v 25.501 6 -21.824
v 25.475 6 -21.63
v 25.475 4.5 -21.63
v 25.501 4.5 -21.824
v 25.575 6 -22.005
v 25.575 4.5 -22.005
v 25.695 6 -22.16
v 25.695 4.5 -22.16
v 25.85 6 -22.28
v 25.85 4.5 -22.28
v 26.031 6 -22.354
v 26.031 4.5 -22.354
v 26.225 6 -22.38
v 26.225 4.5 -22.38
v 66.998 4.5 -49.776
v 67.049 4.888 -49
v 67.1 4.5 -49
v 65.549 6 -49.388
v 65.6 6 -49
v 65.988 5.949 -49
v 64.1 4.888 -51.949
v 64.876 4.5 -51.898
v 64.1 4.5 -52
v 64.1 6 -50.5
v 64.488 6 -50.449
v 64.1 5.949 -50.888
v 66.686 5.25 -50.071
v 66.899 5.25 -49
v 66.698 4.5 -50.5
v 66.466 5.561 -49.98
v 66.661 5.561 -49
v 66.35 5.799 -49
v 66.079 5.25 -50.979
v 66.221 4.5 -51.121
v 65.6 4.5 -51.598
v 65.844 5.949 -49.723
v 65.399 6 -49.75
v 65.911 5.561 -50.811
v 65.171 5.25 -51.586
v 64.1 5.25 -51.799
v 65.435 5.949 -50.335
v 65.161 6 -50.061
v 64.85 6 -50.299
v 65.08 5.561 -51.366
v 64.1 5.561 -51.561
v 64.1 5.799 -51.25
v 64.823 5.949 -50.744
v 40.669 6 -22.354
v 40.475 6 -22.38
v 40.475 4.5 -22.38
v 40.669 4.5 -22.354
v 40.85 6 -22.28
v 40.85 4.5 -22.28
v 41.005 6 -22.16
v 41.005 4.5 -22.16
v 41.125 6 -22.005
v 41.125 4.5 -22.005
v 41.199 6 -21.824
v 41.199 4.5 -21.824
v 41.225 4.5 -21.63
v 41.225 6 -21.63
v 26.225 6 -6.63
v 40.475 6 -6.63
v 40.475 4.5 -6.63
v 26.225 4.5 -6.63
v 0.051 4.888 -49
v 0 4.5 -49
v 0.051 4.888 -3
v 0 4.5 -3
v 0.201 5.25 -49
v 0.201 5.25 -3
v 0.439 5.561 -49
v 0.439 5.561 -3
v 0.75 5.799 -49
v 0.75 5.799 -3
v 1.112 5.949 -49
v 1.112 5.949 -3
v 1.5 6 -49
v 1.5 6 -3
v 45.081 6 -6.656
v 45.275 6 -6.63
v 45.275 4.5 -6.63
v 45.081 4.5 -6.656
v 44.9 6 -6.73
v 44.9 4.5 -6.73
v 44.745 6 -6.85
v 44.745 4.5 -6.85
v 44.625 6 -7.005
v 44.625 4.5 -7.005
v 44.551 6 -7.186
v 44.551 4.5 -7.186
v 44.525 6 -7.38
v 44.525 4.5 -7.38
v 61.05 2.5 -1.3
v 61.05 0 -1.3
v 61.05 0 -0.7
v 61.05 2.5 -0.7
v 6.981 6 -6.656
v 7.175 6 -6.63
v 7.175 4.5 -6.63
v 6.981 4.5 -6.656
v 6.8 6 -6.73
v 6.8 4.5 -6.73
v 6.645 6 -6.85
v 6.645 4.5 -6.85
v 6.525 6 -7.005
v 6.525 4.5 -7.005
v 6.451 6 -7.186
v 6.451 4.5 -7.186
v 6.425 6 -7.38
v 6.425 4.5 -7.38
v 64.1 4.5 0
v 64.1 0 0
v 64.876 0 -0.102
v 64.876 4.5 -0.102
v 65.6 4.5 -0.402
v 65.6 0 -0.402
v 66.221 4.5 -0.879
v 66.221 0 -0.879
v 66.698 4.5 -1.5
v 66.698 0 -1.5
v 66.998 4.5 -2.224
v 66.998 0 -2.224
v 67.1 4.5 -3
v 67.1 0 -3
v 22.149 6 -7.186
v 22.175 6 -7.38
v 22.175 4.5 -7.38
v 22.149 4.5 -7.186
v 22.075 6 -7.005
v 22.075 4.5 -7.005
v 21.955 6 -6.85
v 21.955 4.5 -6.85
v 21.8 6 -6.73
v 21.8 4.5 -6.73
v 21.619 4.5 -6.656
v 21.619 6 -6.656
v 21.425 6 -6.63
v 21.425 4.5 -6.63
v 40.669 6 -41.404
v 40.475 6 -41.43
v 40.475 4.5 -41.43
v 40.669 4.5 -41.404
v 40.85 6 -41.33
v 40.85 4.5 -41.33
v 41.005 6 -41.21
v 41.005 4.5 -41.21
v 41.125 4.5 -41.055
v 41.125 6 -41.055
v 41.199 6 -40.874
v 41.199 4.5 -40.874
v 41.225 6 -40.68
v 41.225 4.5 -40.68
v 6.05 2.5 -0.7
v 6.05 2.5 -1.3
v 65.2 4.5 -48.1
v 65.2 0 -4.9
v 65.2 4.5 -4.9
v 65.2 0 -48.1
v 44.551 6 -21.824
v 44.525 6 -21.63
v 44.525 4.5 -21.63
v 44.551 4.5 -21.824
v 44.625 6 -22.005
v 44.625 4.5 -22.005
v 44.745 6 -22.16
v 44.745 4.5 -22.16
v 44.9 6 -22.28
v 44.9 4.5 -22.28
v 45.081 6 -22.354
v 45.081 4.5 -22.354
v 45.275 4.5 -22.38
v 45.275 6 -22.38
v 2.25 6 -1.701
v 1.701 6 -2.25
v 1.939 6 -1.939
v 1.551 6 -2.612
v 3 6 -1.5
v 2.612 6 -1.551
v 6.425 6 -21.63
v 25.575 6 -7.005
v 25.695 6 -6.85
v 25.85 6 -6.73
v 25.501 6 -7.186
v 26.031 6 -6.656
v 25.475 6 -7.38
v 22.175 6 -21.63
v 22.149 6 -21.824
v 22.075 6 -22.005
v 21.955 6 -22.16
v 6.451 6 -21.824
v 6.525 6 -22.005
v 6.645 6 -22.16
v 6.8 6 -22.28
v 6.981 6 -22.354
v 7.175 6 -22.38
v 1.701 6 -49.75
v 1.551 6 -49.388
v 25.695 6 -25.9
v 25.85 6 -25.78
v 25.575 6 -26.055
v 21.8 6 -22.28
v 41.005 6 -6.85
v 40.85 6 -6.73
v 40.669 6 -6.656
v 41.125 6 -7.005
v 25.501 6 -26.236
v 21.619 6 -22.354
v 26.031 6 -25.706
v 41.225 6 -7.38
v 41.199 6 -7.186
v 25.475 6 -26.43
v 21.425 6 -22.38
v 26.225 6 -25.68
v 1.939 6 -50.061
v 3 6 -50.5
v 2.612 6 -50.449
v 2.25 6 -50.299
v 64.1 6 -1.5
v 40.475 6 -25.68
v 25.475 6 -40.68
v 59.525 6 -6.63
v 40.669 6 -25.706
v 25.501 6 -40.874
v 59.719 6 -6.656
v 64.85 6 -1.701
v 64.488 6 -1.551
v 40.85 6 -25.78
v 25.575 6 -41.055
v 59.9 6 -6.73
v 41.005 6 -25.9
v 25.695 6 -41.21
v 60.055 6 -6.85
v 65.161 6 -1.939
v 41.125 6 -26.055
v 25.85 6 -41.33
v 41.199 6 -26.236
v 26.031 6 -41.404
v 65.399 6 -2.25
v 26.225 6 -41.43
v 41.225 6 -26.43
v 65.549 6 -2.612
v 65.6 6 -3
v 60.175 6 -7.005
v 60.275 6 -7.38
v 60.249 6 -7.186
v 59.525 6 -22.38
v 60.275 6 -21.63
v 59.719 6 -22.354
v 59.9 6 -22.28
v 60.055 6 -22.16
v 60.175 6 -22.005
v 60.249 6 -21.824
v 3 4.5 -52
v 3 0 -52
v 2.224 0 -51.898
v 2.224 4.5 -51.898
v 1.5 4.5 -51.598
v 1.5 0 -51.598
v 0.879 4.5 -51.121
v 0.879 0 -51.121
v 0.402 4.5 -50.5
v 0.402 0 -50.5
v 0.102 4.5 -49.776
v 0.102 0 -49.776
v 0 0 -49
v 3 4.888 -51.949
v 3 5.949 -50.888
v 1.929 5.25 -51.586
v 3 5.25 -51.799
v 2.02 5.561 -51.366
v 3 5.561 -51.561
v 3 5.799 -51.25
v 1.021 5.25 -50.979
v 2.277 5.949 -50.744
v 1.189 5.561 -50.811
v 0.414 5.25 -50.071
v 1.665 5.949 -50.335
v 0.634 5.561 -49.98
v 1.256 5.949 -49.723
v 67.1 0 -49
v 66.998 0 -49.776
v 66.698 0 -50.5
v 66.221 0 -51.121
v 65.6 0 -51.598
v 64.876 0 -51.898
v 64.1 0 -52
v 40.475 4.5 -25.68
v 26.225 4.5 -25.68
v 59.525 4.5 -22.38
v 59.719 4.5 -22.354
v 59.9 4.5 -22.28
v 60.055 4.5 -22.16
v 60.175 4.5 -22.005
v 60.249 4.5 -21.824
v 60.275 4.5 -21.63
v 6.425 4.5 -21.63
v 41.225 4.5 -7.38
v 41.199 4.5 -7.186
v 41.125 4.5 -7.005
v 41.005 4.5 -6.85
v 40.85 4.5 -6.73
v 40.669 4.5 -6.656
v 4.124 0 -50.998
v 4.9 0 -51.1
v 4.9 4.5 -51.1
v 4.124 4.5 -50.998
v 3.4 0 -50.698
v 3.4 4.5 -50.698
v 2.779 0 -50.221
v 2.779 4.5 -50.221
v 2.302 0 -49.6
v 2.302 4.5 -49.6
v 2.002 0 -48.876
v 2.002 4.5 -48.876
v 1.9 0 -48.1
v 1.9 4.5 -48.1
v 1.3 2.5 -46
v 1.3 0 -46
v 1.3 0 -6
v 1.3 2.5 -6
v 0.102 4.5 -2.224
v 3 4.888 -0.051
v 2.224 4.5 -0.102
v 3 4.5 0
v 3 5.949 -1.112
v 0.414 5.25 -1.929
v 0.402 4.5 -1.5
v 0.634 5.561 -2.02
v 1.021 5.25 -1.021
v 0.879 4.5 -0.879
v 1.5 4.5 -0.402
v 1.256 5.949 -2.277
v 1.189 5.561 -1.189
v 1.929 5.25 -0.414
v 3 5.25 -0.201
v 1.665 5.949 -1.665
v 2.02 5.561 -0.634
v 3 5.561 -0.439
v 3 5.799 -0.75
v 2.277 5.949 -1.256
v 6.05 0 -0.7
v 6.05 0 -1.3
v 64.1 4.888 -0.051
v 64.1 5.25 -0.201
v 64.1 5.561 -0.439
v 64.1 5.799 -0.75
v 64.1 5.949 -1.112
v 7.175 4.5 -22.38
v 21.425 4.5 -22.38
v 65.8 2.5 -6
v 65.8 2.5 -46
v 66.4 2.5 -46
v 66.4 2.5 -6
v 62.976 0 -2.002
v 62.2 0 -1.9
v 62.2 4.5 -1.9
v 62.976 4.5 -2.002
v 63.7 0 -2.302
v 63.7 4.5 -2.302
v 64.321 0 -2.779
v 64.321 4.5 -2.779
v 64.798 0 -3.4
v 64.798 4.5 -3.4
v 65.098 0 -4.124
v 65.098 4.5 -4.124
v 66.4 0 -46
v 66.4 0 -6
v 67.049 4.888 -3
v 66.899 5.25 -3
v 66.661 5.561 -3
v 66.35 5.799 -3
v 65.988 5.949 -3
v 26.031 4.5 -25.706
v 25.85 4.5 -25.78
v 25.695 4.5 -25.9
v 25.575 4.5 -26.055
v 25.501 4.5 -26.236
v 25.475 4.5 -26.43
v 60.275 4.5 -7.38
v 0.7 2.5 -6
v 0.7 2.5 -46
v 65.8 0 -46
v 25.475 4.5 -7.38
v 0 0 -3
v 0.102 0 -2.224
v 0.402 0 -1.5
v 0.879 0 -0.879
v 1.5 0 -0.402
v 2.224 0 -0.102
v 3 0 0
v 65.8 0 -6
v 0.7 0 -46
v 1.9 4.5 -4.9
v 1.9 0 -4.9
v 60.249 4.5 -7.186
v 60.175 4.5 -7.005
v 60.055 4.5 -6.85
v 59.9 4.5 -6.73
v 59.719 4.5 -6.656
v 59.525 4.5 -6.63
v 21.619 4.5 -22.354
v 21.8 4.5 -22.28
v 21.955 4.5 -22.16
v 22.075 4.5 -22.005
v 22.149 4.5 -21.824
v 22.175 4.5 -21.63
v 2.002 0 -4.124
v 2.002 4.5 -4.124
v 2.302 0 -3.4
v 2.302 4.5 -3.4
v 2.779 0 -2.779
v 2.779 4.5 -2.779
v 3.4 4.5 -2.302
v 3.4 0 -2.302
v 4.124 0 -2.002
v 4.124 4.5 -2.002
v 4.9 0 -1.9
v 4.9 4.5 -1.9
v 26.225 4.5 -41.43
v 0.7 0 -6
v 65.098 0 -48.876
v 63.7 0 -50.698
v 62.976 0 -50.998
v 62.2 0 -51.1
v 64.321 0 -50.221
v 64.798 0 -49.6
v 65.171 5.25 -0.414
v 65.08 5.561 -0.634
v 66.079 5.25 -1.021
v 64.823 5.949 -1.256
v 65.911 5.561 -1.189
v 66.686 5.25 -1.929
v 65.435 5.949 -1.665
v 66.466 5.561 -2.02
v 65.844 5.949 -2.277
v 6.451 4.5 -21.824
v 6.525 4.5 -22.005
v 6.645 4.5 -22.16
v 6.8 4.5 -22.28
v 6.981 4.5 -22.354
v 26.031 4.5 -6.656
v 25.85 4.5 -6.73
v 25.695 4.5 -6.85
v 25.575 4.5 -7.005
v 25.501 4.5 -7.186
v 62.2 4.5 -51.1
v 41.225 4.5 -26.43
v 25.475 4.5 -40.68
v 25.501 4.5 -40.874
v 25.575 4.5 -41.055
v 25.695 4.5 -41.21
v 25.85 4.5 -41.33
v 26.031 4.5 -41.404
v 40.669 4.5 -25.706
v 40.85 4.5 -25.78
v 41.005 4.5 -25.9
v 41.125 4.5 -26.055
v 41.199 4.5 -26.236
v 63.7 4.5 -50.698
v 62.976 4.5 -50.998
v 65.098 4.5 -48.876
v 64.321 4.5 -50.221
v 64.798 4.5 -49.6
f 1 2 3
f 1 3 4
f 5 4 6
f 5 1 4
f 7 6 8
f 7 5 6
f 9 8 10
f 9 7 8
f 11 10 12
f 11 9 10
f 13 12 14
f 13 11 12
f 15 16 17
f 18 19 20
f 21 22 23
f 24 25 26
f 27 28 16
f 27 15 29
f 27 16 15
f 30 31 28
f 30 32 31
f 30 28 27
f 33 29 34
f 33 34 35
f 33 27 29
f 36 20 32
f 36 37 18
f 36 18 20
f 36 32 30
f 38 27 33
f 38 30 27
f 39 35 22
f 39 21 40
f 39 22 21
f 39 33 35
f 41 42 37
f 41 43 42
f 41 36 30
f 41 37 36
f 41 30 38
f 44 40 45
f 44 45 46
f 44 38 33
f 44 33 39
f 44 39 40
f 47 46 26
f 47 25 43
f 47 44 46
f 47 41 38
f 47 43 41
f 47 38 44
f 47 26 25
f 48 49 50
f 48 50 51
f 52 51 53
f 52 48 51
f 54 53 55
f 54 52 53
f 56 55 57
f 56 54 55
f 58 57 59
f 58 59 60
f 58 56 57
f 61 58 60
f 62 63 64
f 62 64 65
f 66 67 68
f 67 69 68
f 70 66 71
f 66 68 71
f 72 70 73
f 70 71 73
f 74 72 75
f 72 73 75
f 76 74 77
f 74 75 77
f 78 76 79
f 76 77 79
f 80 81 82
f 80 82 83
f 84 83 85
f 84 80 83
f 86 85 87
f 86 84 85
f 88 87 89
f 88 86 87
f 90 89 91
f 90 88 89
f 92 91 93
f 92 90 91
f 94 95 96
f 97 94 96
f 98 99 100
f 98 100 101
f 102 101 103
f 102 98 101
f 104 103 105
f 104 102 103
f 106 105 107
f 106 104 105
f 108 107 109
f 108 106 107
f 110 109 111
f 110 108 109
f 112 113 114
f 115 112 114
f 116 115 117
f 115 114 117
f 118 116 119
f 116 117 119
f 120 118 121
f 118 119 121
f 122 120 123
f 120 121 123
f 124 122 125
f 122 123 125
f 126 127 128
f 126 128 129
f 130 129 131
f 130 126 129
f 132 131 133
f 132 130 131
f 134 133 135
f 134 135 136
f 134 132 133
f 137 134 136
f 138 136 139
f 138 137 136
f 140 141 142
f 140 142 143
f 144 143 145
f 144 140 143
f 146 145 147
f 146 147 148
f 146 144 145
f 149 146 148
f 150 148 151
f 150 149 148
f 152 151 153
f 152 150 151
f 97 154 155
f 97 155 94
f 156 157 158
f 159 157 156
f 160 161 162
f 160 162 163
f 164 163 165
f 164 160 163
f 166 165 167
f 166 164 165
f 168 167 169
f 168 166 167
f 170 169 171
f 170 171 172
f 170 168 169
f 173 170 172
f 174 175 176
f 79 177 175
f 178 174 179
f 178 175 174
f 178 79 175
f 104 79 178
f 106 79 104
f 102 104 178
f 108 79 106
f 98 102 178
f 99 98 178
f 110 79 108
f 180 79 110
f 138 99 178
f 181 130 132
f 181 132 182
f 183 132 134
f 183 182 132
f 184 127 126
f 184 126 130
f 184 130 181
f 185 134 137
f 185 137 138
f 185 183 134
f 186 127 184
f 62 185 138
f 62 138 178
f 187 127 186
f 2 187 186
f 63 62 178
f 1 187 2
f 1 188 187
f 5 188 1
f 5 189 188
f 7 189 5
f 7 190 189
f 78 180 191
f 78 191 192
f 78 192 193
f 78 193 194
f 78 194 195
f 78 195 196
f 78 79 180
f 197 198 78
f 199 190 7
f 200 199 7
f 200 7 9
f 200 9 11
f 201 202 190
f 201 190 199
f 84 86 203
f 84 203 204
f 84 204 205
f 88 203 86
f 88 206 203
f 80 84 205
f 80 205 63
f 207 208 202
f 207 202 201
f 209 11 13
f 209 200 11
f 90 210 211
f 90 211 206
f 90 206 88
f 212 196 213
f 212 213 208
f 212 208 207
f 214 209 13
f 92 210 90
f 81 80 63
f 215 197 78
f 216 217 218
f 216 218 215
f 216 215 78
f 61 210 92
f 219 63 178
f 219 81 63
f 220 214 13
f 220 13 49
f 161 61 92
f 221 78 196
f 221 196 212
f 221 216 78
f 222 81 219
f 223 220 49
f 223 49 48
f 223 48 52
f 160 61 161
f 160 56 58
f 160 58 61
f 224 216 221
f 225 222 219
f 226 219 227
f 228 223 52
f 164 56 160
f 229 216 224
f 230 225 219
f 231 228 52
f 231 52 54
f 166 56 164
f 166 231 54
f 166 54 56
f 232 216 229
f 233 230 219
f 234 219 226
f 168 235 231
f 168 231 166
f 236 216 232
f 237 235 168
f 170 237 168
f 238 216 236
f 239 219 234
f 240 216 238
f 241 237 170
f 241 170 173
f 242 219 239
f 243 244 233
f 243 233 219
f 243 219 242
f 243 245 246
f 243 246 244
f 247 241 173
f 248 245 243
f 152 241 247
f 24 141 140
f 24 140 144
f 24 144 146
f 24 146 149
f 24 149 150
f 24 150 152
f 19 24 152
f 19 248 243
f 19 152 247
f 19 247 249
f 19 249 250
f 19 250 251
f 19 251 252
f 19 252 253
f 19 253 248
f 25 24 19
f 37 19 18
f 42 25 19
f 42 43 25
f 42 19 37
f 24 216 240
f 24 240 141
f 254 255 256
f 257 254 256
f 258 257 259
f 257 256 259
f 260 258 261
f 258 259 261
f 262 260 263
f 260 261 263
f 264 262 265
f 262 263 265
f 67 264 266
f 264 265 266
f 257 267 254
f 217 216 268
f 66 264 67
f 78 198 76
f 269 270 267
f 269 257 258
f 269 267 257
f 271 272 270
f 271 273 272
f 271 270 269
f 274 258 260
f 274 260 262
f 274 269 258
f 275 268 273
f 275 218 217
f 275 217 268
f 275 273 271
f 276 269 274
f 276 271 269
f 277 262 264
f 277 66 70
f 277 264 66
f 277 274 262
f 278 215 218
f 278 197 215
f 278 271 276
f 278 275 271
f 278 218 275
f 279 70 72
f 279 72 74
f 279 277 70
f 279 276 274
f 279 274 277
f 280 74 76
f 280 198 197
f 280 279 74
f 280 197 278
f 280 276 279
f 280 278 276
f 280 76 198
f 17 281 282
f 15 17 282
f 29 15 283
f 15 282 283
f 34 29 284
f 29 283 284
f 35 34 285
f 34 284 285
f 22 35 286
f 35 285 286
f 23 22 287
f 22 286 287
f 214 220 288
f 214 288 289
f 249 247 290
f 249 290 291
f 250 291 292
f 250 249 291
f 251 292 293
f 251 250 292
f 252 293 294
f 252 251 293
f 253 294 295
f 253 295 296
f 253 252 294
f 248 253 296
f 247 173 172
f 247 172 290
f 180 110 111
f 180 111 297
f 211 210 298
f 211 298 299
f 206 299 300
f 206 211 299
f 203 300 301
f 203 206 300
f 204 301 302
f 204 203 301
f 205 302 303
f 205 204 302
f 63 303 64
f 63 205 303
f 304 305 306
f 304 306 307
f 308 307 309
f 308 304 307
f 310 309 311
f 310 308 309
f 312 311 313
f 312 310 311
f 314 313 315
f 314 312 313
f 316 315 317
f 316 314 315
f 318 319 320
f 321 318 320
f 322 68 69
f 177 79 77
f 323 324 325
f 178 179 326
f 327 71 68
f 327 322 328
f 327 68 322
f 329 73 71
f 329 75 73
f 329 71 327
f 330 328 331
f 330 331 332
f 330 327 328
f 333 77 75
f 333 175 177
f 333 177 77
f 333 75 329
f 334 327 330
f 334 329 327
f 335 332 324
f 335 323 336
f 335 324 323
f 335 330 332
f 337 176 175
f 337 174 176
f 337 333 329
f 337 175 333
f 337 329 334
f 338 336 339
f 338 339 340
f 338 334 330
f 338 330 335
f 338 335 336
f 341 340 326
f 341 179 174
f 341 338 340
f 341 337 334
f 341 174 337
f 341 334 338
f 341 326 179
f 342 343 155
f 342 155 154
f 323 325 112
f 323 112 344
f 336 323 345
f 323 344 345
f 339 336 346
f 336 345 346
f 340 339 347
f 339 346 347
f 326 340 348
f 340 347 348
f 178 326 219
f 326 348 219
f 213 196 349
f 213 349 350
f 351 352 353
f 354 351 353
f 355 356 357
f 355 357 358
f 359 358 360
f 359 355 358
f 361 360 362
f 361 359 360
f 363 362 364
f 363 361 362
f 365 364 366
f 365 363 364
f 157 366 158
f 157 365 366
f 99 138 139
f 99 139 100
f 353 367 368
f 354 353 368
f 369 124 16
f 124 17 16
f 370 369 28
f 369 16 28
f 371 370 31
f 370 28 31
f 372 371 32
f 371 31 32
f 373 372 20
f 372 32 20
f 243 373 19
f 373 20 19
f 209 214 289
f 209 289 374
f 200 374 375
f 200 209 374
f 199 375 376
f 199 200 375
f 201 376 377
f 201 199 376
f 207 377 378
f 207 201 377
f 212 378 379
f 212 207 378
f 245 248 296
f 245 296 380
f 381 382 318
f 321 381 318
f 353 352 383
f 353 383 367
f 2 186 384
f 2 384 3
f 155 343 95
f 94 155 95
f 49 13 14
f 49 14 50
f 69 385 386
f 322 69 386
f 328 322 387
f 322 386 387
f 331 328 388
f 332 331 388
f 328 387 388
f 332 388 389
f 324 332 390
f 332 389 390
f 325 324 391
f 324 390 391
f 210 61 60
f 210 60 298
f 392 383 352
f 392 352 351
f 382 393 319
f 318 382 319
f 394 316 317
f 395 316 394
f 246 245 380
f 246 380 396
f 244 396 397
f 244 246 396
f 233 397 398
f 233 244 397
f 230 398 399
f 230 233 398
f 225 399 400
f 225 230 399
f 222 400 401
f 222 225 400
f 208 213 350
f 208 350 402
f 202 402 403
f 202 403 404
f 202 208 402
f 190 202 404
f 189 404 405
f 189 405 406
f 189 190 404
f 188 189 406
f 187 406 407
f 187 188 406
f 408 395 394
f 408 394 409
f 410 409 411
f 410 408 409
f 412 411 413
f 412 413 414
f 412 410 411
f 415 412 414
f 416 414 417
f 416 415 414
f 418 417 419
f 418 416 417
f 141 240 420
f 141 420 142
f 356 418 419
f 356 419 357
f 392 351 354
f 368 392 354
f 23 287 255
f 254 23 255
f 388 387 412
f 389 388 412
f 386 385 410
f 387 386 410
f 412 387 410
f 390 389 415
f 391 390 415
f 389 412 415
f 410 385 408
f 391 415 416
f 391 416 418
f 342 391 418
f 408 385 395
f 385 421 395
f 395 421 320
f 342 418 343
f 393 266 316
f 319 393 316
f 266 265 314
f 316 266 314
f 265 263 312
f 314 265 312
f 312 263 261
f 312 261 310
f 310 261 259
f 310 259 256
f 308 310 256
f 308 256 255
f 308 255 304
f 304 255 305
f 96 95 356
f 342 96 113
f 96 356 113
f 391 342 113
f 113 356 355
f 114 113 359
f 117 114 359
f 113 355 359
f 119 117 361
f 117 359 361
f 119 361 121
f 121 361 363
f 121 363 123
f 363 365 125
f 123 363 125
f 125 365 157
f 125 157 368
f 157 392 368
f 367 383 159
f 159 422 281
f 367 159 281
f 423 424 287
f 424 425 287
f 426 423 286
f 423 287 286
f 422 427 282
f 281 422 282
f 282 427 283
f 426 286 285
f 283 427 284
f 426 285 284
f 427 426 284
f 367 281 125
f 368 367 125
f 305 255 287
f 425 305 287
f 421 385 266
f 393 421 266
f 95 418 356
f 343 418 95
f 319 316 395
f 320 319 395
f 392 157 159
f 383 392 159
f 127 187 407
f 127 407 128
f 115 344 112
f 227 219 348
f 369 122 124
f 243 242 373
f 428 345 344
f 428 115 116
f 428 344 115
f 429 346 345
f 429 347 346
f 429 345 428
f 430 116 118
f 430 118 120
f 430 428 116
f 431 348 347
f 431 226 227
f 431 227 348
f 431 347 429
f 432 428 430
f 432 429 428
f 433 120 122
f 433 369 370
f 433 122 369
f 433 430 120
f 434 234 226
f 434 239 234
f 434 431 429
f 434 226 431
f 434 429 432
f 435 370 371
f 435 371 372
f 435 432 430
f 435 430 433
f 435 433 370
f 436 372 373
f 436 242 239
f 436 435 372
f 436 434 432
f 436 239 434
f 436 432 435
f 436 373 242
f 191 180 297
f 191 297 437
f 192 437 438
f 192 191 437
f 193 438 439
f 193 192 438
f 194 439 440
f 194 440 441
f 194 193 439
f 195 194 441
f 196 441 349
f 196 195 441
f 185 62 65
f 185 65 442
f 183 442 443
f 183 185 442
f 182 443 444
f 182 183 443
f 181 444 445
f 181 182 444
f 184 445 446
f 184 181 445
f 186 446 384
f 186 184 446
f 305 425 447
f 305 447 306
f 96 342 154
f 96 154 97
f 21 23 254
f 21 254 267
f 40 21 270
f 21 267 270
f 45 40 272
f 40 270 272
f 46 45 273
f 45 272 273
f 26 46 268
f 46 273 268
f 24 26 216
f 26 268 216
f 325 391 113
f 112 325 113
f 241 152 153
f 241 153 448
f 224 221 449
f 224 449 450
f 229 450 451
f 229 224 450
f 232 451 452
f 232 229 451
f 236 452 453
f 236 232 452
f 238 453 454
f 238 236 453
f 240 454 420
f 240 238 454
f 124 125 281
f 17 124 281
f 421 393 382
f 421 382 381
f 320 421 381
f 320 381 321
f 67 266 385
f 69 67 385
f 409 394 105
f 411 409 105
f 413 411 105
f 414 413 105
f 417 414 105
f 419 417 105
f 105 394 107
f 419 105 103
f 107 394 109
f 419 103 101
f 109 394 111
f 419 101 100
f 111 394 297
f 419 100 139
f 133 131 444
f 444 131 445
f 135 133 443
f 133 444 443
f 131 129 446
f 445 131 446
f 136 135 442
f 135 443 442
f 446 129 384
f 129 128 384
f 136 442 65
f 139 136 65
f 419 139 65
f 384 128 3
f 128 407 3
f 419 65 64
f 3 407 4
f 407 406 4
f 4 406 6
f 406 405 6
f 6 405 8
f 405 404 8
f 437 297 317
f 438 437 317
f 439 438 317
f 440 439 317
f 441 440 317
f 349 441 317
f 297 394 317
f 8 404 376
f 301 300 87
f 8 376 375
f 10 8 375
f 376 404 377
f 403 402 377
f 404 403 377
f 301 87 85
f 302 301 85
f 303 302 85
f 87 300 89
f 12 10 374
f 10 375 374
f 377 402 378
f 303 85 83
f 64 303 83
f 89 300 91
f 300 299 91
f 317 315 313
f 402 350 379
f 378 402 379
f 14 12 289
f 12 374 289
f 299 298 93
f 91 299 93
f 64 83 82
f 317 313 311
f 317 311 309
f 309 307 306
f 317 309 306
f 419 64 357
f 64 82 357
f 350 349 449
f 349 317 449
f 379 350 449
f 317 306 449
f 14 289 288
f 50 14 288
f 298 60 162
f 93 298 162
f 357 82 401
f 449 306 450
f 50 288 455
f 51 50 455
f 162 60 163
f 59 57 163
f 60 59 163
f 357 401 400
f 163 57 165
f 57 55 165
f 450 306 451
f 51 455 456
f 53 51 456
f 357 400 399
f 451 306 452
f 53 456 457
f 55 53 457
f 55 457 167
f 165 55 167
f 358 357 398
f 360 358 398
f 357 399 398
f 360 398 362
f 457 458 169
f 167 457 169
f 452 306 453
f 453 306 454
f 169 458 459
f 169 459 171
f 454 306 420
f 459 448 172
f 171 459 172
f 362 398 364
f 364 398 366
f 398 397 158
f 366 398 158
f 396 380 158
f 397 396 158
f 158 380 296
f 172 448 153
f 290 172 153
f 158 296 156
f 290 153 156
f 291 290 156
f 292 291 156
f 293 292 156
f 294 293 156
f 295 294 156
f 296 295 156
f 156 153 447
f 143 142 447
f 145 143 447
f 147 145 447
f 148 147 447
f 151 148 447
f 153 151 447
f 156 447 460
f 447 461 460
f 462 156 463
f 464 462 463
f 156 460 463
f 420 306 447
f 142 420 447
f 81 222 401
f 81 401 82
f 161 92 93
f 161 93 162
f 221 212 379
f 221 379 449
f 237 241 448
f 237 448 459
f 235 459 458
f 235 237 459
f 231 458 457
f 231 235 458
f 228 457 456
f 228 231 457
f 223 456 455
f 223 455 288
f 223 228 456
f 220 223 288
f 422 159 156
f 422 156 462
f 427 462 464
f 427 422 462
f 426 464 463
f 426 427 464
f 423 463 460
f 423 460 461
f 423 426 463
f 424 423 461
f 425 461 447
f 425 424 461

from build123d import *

# Parameters (mm, degrees)
BOSS_EXTRUDE1_DEPTH = 6
CUT_EXTRUDE1_DEPTH  = 4.5
CUT_EXTRUDE2_DEPTH  = 1.5
FILLET1_R           = 1.5
SKETCH4_W           = 0.6
SKETCH4_H           = 40
SKETCH4_W_2         = 55
SKETCH4_H_2         = 0.6
CUT_EXTRUDE3_DEPTH  = 2.5


with BuildPart() as part:
    # Sketch1 → Boss-Extrude1 (new body)
    with BuildSketch(Plane(origin=(0, 0, 0), x_dir=(1, 0, 0), z_dir=(0, 1, 0))):
        with BuildLine():
            Line((3, 0), (64.1, 0))
            ThreePointArc((64.1, 0), (66.221320344, 0.878679656), (67.1, 3))
            Line((67.1, 3), (67.1, 49))
            ThreePointArc((67.1, 49), (66.221320344, 51.121320344), (64.1, 52))
            Line((64.1, 52), (3, 52))
            ThreePointArc((3, 52), (0.878679656, 51.121320344), (0, 49))
            Line((0, 49), (0, 3))
            ThreePointArc((0, 3), (0.878679656, 0.878679656), (3, 0))
        make_face()
    extrude(amount=BOSS_EXTRUDE1_DEPTH)

    # Sketch2 → Cut-Extrude1 (cut)
    with BuildSketch(Plane(origin=(0, 0, 0), x_dir=(-1, 0, 0), z_dir=(0, -1, 0))):
        with BuildLine():
            Line((-4.9, 1.9), (-62.2, 1.9))
            ThreePointArc((-62.2, 1.9), (-64.321320344, 2.778679656), (-65.2, 4.9))
            Line((-65.2, 4.9), (-65.2, 48.1))
            ThreePointArc((-65.2, 48.1), (-64.321320344, 50.221320344), (-62.2, 51.1))
            Line((-62.2, 51.1), (-4.9, 51.1))
            ThreePointArc((-4.9, 51.1), (-2.778679656, 50.221320344), (-1.9, 48.1))
            Line((-1.9, 48.1), (-1.9, 4.9))
            ThreePointArc((-1.9, 4.9), (-2.778679656, 2.778679656), (-4.9, 1.9))
        make_face()
    extrude(amount=-CUT_EXTRUDE1_DEPTH, mode=Mode.SUBTRACT)

    # Sketch3 → Cut-Extrude2 (cut)
    with BuildSketch(Plane(origin=(0, 6, 0), x_dir=(1, 0, 0), z_dir=(0, 1, 0))):
        with BuildLine():
            Line((26.225, 41.43), (40.475, 41.43))
            ThreePointArc((40.475, 41.43), (41.005330086, 41.210330086), (41.225, 40.68))
            Line((41.225, 40.68), (41.225, 26.43))
            ThreePointArc((41.225, 26.43), (41.005330086, 25.899669914), (40.475, 25.68))
            Line((40.475, 25.68), (26.225, 25.68))
            ThreePointArc((26.225, 25.68), (25.694669914, 25.899669914), (25.475, 26.43))
            Line((25.475, 26.43), (25.475, 40.68))
            ThreePointArc((25.475, 40.68), (25.694669914, 41.210330086), (26.225, 41.43))
        make_face()
        with BuildLine():
            Line((7.175, 22.38), (21.425, 22.38))
            ThreePointArc((21.425, 22.38), (21.955330086, 22.160330086), (22.175, 21.63))
            Line((22.175, 21.63), (22.175, 7.38))
            ThreePointArc((22.175, 7.38), (21.955330086, 6.849669914), (21.425, 6.63))
            Line((21.425, 6.63), (7.175, 6.63))
            ThreePointArc((7.175, 6.63), (6.644669914, 6.849669914), (6.425, 7.38))
            Line((6.425, 7.38), (6.425, 21.63))
            ThreePointArc((6.425, 21.63), (6.644669914, 22.160330086), (7.175, 22.38))
        make_face()
        with BuildLine():
            Line((26.225, 22.38), (40.475, 22.38))
            ThreePointArc((40.475, 22.38), (41.005330086, 22.160330086), (41.225, 21.63))
            Line((41.225, 21.63), (41.225, 7.38))
            ThreePointArc((41.225, 7.38), (41.005330086, 6.849669914), (40.475, 6.63))
            Line((40.475, 6.63), (26.225, 6.63))
            ThreePointArc((26.225, 6.63), (25.694669914, 6.849669914), (25.475, 7.38))
            Line((25.475, 7.38), (25.475, 21.63))
            ThreePointArc((25.475, 21.63), (25.694669914, 22.160330086), (26.225, 22.38))
        make_face()
        with BuildLine():
            Line((45.275, 22.38), (59.525, 22.38))
            ThreePointArc((59.525, 22.38), (60.055330086, 22.160330086), (60.275, 21.63))
            Line((60.275, 21.63), (60.275, 7.38))
            ThreePointArc((60.275, 7.38), (60.055330086, 6.849669914), (59.525, 6.63))
            Line((59.525, 6.63), (45.275, 6.63))
            ThreePointArc((45.275, 6.63), (44.744669914, 6.849669914), (44.525, 7.38))
            Line((44.525, 7.38), (44.525, 21.63))
            ThreePointArc((44.525, 21.63), (44.744669914, 22.160330086), (45.275, 22.38))
        make_face()
    extrude(amount=-CUT_EXTRUDE2_DEPTH, mode=Mode.SUBTRACT)

    # Fillet1
    fillet1_edges = [part.edges().sort_by_distance(p)[0] for p in [
        (66.221320344, 6, -0.878679656),
        (67.1, 6, -26),
        (66.221320344, 6, -51.121320344),
        (33.55, 6, -52),
        (0.878679656, 6, -51.121320344),
        (0, 6, -26),
        (0.878679656, 6, -0.878679656),
        (33.55, 6, 0),
    ]]
    fillet(fillet1_edges, radius=FILLET1_R)

    # Sketch4 → Cut-Extrude3 (cut)
    with BuildSketch(Plane.XZ):
        with Locations((1, -26)):
            Rectangle(SKETCH4_W, SKETCH4_H)
        with Locations((33.55, -1)):
            Rectangle(SKETCH4_W_2, SKETCH4_H_2)
        with Locations((66.1, -26)):
            Rectangle(SKETCH4_W, SKETCH4_H)
    extrude(amount=-CUT_EXTRUDE3_DEPTH, mode=Mode.SUBTRACT)


solid = part.part
